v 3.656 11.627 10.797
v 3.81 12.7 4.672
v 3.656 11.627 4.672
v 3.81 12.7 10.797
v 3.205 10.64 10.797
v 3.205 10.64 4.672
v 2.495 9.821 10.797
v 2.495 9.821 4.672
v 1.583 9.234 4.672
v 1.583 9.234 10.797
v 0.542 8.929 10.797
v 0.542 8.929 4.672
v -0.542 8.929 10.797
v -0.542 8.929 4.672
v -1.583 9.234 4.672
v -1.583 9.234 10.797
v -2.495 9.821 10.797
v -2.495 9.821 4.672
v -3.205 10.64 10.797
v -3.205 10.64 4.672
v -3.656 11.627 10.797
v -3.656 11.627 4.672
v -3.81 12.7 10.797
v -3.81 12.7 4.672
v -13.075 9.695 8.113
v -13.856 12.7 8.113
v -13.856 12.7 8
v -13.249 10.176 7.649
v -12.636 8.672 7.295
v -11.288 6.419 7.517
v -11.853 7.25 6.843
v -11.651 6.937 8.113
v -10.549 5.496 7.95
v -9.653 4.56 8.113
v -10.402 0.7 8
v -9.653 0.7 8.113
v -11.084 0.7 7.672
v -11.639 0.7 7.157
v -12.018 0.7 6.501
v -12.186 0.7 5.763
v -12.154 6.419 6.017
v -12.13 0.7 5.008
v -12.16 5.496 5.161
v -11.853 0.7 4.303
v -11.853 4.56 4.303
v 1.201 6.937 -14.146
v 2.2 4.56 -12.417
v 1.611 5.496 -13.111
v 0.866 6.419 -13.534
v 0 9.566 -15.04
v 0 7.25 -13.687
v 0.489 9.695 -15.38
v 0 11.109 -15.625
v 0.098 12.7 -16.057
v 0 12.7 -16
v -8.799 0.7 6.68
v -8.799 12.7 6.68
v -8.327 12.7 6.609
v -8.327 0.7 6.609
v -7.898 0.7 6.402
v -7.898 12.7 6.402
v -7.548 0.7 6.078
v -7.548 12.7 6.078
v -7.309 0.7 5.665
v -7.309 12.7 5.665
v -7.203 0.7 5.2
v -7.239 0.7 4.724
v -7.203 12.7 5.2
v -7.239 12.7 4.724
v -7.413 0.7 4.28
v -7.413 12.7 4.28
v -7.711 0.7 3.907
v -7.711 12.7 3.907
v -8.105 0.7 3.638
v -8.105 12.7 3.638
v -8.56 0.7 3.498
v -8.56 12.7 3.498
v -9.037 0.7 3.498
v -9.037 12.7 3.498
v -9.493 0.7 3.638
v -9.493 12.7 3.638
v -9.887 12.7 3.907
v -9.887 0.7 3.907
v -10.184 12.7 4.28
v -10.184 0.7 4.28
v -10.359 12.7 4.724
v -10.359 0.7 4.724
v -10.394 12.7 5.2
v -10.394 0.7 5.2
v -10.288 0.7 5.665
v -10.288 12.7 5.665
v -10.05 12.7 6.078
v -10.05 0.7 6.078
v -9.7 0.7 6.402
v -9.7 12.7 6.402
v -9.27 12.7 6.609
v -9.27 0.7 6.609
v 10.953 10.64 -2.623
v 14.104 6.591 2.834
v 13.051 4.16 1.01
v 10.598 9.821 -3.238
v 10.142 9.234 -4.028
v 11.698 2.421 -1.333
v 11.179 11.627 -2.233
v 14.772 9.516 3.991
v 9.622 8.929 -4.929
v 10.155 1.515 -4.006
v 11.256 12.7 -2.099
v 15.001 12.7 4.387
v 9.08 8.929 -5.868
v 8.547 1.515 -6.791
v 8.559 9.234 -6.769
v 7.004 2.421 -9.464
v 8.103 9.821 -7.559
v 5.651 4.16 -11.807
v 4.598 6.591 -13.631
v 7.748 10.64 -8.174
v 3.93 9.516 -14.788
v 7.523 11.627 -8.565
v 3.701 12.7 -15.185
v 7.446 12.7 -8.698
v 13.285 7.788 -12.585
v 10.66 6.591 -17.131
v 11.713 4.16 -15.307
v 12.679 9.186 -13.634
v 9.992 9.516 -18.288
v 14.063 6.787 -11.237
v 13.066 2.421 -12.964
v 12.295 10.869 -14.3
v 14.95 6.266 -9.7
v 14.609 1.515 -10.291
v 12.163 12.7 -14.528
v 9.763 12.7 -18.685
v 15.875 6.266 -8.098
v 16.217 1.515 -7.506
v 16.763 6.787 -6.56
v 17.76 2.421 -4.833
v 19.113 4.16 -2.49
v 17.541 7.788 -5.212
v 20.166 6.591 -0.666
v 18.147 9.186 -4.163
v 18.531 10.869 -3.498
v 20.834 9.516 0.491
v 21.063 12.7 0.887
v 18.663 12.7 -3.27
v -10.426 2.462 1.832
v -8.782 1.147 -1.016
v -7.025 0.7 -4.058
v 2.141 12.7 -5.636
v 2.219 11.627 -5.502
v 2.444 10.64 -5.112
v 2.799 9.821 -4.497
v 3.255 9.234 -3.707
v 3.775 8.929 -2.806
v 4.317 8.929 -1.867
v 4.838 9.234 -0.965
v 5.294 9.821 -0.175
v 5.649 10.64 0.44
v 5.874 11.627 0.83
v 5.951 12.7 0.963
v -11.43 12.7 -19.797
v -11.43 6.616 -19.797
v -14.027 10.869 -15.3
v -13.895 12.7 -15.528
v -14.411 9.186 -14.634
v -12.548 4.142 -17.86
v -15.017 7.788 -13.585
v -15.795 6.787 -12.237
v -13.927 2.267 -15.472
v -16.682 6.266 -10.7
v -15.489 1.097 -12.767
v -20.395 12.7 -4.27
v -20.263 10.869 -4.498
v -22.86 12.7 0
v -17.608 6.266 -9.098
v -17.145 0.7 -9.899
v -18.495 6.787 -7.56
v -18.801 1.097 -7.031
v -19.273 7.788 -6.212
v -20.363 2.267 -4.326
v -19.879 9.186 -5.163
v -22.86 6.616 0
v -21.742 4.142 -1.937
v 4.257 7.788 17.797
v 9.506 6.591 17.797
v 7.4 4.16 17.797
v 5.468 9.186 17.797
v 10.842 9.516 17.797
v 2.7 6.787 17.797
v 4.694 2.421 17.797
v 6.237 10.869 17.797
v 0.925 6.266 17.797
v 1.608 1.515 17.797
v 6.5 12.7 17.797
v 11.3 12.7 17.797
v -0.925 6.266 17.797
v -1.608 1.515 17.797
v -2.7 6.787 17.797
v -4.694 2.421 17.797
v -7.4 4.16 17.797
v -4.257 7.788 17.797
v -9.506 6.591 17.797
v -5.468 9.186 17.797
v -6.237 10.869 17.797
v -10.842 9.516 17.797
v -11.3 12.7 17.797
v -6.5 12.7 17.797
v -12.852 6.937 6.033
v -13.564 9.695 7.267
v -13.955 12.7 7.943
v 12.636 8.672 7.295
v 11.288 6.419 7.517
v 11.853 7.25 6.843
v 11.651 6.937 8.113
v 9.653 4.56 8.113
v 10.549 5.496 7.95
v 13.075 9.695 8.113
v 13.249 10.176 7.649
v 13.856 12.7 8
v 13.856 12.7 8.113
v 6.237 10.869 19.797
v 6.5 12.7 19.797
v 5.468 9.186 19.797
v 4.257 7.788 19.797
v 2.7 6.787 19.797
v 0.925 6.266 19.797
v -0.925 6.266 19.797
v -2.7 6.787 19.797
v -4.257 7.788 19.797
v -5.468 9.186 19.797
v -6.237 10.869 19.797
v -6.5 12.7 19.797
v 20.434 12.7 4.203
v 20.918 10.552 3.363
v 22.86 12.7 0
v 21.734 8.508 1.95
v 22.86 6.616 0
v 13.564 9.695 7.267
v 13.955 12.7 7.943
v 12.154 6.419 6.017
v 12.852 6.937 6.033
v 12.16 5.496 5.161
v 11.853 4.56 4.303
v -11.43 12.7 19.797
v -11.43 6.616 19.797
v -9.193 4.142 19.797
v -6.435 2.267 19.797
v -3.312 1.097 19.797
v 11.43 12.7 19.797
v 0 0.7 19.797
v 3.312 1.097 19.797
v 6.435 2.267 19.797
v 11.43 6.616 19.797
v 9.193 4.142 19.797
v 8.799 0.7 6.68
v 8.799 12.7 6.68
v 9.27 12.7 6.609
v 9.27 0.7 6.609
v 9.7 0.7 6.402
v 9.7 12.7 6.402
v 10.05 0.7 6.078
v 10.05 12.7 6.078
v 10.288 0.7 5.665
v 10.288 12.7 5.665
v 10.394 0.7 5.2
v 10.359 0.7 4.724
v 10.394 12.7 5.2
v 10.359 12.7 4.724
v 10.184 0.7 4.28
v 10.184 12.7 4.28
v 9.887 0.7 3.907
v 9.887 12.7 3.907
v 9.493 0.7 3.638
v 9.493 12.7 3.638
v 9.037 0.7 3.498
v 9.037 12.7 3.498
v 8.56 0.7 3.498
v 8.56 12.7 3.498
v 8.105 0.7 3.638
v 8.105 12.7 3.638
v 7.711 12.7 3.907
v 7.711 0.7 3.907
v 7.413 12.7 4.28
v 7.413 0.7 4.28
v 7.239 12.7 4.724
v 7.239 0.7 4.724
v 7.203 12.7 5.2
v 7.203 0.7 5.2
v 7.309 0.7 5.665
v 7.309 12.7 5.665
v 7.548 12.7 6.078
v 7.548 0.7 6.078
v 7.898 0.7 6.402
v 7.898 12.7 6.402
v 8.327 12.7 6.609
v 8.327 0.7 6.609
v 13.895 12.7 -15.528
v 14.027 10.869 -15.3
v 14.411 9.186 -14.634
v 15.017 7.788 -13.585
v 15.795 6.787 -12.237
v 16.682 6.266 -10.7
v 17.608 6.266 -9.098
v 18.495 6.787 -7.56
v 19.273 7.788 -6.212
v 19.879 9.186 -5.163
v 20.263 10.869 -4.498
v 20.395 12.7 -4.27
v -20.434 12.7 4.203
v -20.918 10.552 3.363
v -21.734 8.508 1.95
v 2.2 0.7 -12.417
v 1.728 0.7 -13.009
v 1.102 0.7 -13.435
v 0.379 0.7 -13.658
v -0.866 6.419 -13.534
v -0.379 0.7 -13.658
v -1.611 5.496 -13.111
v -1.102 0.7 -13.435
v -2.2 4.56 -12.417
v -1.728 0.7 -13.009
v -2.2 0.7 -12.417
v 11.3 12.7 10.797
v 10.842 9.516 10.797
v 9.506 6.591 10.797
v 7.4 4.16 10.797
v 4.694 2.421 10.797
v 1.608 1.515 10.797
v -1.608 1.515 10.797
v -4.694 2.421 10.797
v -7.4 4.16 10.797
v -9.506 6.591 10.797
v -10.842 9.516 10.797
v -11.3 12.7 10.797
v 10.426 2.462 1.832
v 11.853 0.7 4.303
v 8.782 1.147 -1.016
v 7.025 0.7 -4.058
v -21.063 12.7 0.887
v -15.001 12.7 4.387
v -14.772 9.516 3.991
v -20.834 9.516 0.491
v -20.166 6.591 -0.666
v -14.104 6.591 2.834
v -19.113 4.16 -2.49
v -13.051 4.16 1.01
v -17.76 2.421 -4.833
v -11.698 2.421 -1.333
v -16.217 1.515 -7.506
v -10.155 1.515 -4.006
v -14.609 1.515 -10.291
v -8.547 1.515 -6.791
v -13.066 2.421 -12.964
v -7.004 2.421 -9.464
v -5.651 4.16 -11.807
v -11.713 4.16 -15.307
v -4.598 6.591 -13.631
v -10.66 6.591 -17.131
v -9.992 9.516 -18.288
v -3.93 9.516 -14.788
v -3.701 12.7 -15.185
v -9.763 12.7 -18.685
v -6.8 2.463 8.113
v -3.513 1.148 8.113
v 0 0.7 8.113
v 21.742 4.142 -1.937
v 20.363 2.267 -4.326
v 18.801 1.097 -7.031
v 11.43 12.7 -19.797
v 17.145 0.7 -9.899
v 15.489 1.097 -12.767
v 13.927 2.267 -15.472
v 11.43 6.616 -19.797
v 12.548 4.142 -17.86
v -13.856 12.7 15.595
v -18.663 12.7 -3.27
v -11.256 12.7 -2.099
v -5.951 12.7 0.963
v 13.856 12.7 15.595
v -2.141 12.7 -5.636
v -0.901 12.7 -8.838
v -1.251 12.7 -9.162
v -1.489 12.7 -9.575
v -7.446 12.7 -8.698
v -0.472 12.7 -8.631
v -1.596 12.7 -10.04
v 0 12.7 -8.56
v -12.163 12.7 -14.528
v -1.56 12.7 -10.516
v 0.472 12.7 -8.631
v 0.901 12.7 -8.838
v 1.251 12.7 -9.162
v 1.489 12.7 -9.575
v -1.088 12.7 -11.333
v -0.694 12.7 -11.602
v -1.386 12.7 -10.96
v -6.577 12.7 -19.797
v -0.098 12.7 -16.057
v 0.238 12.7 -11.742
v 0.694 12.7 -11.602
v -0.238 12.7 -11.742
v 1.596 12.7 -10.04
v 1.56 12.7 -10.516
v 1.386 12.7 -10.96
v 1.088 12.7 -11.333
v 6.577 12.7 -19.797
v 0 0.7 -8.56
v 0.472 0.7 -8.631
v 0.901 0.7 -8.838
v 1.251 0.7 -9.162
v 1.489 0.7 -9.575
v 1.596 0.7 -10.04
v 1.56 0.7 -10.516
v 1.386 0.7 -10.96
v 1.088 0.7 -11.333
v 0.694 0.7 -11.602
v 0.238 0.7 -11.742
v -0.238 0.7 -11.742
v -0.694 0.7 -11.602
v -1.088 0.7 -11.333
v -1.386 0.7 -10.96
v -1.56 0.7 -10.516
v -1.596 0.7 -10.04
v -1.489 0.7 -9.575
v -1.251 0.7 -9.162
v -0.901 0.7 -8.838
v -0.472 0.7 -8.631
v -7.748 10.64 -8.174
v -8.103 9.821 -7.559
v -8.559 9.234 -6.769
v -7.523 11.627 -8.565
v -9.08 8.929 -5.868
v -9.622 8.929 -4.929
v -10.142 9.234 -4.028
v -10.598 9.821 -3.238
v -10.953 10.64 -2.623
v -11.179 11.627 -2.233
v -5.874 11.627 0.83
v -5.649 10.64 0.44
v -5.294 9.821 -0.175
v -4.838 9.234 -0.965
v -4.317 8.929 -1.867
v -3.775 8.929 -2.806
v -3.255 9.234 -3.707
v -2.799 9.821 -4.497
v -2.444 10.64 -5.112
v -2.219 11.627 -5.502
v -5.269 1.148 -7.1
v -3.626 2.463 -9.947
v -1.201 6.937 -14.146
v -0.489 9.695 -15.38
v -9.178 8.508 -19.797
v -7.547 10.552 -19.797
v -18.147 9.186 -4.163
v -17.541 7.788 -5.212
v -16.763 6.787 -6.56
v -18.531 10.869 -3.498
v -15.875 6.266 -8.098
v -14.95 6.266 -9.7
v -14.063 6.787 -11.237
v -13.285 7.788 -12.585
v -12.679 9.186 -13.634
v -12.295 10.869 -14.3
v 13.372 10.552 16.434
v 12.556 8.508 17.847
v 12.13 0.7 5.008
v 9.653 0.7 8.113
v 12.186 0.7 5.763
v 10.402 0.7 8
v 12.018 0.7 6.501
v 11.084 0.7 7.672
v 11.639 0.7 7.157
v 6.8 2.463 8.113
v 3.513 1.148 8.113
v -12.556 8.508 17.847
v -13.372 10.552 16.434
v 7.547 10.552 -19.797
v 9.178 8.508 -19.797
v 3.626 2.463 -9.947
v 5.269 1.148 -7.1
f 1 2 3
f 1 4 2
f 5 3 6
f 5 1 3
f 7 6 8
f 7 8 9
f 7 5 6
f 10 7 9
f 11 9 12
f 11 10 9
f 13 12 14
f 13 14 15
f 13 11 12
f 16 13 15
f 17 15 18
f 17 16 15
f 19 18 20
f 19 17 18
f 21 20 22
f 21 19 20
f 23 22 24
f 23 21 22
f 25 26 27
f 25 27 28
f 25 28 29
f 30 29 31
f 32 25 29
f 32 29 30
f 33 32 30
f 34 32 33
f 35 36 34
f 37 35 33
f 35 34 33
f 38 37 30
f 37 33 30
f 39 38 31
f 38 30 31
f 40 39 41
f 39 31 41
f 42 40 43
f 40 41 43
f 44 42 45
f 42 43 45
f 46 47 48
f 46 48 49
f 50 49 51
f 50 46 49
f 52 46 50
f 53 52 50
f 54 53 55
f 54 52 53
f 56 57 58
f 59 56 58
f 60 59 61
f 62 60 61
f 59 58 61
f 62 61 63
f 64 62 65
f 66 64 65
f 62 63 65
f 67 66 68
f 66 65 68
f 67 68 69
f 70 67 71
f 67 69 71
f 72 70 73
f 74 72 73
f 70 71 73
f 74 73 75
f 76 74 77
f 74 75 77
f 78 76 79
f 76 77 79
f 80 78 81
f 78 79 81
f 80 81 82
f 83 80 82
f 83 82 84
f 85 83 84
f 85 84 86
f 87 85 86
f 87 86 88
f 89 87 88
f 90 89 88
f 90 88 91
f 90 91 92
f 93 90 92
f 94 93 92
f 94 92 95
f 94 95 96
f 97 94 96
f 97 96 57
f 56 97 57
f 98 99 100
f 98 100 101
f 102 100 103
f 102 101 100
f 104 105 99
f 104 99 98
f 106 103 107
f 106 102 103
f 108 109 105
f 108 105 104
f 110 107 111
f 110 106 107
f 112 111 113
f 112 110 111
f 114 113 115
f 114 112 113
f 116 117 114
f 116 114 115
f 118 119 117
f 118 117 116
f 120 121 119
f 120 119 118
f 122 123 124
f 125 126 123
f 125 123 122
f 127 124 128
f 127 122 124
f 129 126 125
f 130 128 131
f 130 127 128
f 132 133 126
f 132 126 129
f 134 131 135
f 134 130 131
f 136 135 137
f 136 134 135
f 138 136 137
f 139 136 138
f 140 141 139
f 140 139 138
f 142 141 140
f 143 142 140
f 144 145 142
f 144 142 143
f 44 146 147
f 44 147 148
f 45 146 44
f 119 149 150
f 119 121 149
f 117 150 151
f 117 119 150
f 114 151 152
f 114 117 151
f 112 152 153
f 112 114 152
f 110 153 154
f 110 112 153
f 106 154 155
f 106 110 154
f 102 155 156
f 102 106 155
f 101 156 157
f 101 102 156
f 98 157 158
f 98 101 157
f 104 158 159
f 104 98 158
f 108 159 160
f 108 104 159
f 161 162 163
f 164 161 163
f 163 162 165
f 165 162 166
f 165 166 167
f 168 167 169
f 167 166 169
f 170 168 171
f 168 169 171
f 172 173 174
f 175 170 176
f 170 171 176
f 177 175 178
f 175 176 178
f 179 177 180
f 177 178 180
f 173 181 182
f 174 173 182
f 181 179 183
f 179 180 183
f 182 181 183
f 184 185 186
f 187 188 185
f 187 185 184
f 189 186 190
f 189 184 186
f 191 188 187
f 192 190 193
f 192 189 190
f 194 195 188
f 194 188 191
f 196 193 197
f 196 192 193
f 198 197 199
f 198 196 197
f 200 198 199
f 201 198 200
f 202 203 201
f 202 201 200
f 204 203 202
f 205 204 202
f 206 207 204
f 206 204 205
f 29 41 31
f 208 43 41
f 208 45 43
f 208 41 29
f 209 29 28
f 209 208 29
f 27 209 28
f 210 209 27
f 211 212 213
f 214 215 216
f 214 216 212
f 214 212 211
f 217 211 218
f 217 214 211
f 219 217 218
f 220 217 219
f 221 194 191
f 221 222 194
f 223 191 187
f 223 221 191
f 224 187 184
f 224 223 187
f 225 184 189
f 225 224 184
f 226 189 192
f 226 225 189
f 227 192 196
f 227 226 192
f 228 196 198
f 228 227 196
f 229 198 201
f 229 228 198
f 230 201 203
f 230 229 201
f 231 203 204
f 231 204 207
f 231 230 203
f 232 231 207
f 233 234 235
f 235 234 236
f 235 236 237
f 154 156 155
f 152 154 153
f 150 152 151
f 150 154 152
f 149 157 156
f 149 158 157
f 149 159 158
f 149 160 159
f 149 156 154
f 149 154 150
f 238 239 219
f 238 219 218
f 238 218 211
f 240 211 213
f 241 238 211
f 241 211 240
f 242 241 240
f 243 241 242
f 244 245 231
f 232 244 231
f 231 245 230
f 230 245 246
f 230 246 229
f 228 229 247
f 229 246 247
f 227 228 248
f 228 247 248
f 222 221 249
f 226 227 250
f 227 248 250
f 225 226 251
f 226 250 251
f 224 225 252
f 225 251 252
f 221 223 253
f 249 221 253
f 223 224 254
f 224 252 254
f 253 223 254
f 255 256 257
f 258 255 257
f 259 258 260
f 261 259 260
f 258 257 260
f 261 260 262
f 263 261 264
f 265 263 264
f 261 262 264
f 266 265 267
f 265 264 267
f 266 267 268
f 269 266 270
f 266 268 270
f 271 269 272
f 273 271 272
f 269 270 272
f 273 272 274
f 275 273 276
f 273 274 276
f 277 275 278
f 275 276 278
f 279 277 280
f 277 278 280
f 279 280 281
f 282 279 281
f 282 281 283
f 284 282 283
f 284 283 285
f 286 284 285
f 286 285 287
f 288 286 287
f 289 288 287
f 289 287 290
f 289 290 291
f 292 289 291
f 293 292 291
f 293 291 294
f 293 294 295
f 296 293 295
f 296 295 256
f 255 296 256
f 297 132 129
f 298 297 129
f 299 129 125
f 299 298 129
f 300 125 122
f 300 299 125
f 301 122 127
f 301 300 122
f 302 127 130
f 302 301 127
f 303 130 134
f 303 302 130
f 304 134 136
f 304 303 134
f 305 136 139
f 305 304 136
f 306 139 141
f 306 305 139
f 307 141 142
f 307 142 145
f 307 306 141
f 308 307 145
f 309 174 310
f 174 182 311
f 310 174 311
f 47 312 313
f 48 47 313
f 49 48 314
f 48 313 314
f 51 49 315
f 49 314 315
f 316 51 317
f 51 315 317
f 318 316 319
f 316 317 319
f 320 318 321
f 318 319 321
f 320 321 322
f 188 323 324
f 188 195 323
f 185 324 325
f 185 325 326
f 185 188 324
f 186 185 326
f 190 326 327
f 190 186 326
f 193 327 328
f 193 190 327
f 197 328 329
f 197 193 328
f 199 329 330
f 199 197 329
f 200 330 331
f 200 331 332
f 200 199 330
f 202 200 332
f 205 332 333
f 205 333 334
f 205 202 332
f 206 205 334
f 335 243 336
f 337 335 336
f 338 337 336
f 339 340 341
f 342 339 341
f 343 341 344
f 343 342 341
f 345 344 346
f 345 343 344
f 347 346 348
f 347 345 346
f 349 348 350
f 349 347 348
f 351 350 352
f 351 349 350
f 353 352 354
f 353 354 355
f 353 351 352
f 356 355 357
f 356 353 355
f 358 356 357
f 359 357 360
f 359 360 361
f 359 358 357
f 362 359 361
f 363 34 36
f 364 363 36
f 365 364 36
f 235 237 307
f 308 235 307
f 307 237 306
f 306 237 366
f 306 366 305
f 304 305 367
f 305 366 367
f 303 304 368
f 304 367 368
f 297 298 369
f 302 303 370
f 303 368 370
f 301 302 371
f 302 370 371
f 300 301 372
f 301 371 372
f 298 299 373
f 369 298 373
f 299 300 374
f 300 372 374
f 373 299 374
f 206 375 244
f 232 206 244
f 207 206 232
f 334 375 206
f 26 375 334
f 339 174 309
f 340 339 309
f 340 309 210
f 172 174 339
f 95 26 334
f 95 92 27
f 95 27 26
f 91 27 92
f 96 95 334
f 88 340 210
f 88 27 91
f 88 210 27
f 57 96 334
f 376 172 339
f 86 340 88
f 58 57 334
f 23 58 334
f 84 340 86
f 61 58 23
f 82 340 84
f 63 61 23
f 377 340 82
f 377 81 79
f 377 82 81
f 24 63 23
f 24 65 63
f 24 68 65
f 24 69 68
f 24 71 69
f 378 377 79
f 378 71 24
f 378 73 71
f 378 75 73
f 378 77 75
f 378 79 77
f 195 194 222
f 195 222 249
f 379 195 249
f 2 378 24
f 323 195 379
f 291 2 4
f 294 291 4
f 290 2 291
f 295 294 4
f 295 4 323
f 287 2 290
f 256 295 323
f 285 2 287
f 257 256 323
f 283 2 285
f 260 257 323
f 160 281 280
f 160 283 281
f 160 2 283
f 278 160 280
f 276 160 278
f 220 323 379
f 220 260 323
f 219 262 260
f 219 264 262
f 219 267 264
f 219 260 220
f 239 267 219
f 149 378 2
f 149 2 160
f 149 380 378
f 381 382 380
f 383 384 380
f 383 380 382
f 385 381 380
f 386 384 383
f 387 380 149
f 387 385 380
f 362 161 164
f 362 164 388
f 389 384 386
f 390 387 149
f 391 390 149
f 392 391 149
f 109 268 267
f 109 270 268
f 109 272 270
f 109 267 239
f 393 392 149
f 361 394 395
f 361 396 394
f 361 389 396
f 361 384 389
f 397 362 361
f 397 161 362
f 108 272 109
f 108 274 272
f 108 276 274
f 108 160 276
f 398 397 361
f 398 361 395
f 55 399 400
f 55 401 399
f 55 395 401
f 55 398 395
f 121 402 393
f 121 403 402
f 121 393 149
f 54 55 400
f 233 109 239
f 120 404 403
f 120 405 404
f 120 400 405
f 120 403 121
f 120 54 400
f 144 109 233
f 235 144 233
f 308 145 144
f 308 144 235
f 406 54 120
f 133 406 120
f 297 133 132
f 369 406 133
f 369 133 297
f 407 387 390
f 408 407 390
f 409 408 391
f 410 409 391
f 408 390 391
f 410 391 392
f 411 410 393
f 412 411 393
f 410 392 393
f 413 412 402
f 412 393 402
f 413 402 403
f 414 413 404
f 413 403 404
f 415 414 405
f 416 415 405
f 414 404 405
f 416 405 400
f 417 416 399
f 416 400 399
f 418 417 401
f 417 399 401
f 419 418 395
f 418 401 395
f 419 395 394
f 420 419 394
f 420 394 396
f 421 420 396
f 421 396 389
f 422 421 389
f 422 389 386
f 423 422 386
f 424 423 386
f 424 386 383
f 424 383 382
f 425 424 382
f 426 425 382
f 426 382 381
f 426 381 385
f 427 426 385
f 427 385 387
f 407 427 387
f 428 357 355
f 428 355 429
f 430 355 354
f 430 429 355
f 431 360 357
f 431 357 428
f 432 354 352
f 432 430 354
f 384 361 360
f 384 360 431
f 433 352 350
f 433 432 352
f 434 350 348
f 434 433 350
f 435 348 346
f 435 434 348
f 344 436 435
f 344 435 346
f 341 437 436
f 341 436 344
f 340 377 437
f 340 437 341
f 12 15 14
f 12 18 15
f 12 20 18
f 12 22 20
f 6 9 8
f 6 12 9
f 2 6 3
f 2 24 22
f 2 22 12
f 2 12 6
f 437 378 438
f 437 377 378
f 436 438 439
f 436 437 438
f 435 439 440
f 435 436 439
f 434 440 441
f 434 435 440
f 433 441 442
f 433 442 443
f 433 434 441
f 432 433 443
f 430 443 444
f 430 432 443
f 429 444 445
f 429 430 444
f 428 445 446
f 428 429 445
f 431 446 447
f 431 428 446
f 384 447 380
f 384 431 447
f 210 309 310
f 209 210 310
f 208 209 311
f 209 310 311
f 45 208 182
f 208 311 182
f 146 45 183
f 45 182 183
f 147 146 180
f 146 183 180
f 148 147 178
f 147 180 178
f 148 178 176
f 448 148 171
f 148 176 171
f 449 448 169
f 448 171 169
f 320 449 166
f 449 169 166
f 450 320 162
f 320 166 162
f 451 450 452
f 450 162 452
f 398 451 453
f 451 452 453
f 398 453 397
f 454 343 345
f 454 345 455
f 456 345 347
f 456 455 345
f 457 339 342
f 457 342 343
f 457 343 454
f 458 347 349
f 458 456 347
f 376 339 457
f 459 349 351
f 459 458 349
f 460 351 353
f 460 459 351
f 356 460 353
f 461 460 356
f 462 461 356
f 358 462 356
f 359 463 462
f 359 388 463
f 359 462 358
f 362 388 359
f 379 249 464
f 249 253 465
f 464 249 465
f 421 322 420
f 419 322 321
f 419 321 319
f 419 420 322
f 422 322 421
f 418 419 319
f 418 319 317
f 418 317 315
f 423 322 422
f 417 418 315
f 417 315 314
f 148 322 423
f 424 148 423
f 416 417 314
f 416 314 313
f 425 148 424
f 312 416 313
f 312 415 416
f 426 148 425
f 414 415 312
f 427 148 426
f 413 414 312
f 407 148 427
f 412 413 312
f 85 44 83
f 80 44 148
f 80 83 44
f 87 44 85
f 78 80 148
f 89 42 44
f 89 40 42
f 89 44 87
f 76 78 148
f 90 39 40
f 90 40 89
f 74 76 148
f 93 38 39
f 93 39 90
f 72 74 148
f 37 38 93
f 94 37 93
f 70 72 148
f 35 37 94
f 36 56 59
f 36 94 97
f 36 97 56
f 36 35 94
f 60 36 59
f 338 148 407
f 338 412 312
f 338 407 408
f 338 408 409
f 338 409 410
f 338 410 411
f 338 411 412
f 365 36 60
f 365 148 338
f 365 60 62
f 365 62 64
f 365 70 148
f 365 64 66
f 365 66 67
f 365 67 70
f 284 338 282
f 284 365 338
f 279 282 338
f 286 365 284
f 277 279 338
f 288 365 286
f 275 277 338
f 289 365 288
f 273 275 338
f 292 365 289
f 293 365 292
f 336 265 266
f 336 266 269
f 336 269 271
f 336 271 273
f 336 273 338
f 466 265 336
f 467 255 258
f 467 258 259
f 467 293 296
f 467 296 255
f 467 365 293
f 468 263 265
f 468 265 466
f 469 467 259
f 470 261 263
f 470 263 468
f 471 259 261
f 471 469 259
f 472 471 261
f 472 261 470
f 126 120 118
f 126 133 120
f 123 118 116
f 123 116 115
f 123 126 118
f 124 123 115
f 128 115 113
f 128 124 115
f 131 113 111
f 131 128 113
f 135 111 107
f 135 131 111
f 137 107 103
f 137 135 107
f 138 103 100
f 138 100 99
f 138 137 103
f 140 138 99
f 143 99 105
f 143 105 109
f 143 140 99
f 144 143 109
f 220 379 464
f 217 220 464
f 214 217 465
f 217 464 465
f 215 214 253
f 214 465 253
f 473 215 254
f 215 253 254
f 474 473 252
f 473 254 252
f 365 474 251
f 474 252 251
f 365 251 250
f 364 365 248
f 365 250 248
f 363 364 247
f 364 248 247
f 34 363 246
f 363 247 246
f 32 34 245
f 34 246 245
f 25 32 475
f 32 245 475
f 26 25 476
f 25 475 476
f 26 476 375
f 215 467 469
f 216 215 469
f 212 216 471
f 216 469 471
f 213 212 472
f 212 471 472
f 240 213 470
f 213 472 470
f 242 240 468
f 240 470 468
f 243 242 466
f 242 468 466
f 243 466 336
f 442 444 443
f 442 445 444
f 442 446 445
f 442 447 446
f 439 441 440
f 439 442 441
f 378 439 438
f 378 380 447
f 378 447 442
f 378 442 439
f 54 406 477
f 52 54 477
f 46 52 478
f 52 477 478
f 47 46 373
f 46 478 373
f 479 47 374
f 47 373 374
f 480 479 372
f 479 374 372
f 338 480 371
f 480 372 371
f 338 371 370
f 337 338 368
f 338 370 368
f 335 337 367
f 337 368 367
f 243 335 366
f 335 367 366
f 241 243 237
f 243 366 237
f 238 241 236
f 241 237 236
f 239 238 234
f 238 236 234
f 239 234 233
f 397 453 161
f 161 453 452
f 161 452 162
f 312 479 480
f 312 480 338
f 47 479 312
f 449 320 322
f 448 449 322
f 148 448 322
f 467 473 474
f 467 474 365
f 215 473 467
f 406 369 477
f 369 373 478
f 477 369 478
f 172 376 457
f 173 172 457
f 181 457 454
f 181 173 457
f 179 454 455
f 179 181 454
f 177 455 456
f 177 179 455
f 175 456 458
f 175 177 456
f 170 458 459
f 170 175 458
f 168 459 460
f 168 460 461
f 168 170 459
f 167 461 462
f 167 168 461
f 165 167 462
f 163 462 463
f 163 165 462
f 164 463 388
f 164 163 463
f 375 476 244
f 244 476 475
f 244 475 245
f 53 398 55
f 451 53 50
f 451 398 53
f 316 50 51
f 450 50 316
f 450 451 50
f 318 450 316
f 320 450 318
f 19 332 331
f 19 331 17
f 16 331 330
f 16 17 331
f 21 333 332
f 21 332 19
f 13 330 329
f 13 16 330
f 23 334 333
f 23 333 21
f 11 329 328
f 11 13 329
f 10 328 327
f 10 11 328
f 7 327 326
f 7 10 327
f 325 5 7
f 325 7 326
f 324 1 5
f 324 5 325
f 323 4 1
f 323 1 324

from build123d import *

# Parameters (mm, degrees)
BOSS_EXTRUDE1_DEPTH = 12.7
SKETCH7_R           = 1.6
CUT_EXTRUDE2_DEPTH  = 12.7
CIRPATTERN1_COUNT   = 3
CUT_EXTRUDE3_DEPTH  = 11.684
CIRPATTERN2_COUNT   = 3
CUT_EXTRUDE5_DEPTH  = 0.7
FILLET2_R           = 2.54


with BuildPart() as part:
    # Sketch1 → Boss-Extrude1 (new body)
    with BuildSketch(Plane(origin=(0, 0, 0), x_dir=(1, 0, 0), z_dir=(0, 1, 0))):
        Polygon((11.43, -19.797340731), (22.86, 0), (11.43, 19.797340731), (-11.43, 19.797340731), (-22.86, 0), (-11.43, -19.797340731), align=None)
    extrude(amount=BOSS_EXTRUDE1_DEPTH)

    # Sketch5 → Cut-Revolve1 (revolve, cut)
    with BuildSketch(Plane(origin=(0, 12.7, 0), x_dir=(1, 0, 0), z_dir=(0, 1, 0))):
        Polygon((0, -19.797340731), (0, -4.672340739), (-3.81, -4.672340739), (-3.81, -10.797340731), (-11.300000006, -10.797340731), (-11.300000006, -17.797340731), (-6.5, -17.797340731), (-6.5, -19.797340731), align=None)
    cut_revolve1 = revolve(axis=Axis((0, 12.7, 19.797340731), (0, 0, -1)), mode=Mode.SUBTRACT)

    # Sketch7 → Cut-Extrude2 (cut)
    with BuildSketch(Plane(origin=(0, 12.7, 0), x_dir=(1, 0, 0), z_dir=(0, 1, 0))):
        with Locations(Location((0, 10.16, 0), (0, 0, 270))):
            Circle(SKETCH7_R)
        with Locations(Location((8.798818102, -5.08, 0), (0, 0, 270))):
            Circle(SKETCH7_R)
        with Locations(Location((-8.798818102, -5.08, 0), (0, 0, 270))):
            Circle(SKETCH7_R)
    extrude(amount=-CUT_EXTRUDE2_DEPTH, mode=Mode.SUBTRACT)

    # CirPattern1: Cut-Revolve1 ×3 about axis
    cirpattern1_axis = Axis((0, 0, 0), (0, 1, 0))
    for i in range(1, CIRPATTERN1_COUNT):
        add(cut_revolve1.rotate(cirpattern1_axis, i * 360 / CIRPATTERN1_COUNT), mode=Mode.SUBTRACT)

    # Sketch8 → Cut-Extrude3 (cut)
    with BuildSketch(Plane.XY.offset(19.797340731)):
        with BuildLine():
            Line((-13.856406592, 12.7), (-18.662949192, 12.7))
            Line((-18.662949192, 12.7), (-18.662949192, 0))
            Line((-18.662949192, 0), (18.662949192, 0))
            Line((18.662949192, 0), (18.662949192, 12.7))
            Line((18.662949192, 12.7), (13.856406592, 12.7))
            ThreePointArc((13.856406592, 12.7), (0, 0.69999987), (-13.856406592, 12.7))
        make_face()
    cut_extrude3 = extrude(amount=-CUT_EXTRUDE3_DEPTH, mode=Mode.SUBTRACT)

    # CirPattern2: Cut-Extrude3 ×3 about axis
    cirpattern2_axis = Axis((0, 0, 0), (0, 1, 0))
    for i in range(1, CIRPATTERN2_COUNT):
        add(cut_extrude3.rotate(cirpattern2_axis, i * 360 / CIRPATTERN2_COUNT), mode=Mode.SUBTRACT)

    # Sketch10 → Cut-Extrude5 (cut)
    with BuildSketch(Plane.XZ):
        Polygon((14.052718364, 8.113340731), (-14.052718364, 8.113340731), (0, -16.226681461), align=None)
    extrude(amount=-CUT_EXTRUDE5_DEPTH, mode=Mode.SUBTRACT)

    # Fillet2
    # the kernel refuses this fillet: 2.54 mm, written as the material it takes off along each edge
    with BuildSketch(Plane(origin=(14.052718364, -10.298522628, 8.113340731), x_dir=(-0.4999999999999996, 0, -0.8660254037844387), z_dir=(0, 1, 0))) as fillet2_piece_1_section:
        with BuildLine():
            CenterArc((FILLET2_R * 1.73205080757, FILLET2_R), FILLET2_R, 150, 120)
            Line((FILLET2_R * 0.866025403784, FILLET2_R * 1.5), (0, 0))
            Line((0, 0), (FILLET2_R * 1.73205080757, 0))
        make_face()
    fillet2_piece_1 = extrude(amount=33.997045256, mode=Mode.PRIVATE)
    fillet2_piece_1 = fillet2_piece_1 - Plane(origin=(6.277314066, 14.7, -3.624208966), x_dir=(-0.49487165940112743, -0.14285714153061227, -0.8571428573086736), z_dir=(0.8660254037844388, 0, -0.49999999999999983)) * Cylinder(14.00000013, 86, mode=Mode.PRIVATE)
    fillet2_piece_1 = fillet2_piece_1 - Plane(origin=(0, 14.7, 7.248417919), x_dir=(0.9897433188022552, -0.14285714153061224, 0), z_dir=(0, 0, 1)) * Cylinder(14.00000013, 86, mode=Mode.PRIVATE)
    add(fillet2_piece_1, mode=Mode.SUBTRACT)
    with BuildSketch(Plane(origin=(0, -10.298522628, -16.226681461), x_dir=(-0.5000000000000003, 0, 0.8660254037844386), z_dir=(0, 1, 0))) as fillet2_piece_2_section:
        with BuildLine():
            CenterArc((FILLET2_R * 1.73205080757, FILLET2_R), FILLET2_R, 150, 120)
            Line((FILLET2_R * 0.866025403784, FILLET2_R * 1.5), (0, 0))
            Line((0, 0), (FILLET2_R * 1.73205080757, 0))
        make_face()
    fillet2_piece_2 = extrude(amount=33.997045256, mode=Mode.PRIVATE)
    fillet2_piece_2 = fillet2_piece_2 - Plane(origin=(6.277314055, 14.7, -3.62420896), x_dir=(-0.49487165940112743, -0.14285714153061227, -0.8571428573086736), z_dir=(0.8660254037844388, 0, -0.49999999999999983)) * Cylinder(14.00000013, 86, mode=Mode.PRIVATE)
    fillet2_piece_2 = fillet2_piece_2 - Plane(origin=(-6.277314066, 14.7, -3.624208966), x_dir=(-0.4948716594011281, -0.14285714153061227, 0.8571428573086732), z_dir=(-0.8660254037844384, 0, -0.5000000000000004)) * Cylinder(14.00000013, 86, mode=Mode.PRIVATE)
    add(fillet2_piece_2, mode=Mode.SUBTRACT)
    with BuildSketch(Plane(origin=(-14.052718364, 23.698522628, 8.113340731), x_dir=(1, 0, 0), z_dir=(0, -1, 0))) as fillet2_piece_3_section:
        with BuildLine():
            CenterArc((FILLET2_R * 1.73205080757, -FILLET2_R), FILLET2_R, 90, 120)
            Line((FILLET2_R * 0.866025403784, -FILLET2_R * 1.5), (0, 0))
            Line((0, 0), (FILLET2_R * 1.73205080757, 0))
        make_face()
    fillet2_piece_3 = extrude(amount=33.997045256, mode=Mode.PRIVATE)
    fillet2_piece_3 = fillet2_piece_3 - Plane(origin=(0, 14.7, 7.248417932), x_dir=(0.9897433188022552, -0.14285714153061224, 0), z_dir=(0, 0, 1)) * Cylinder(14.00000013, 86, mode=Mode.PRIVATE)
    fillet2_piece_3 = fillet2_piece_3 - Plane(origin=(-6.277314055, 14.7, -3.62420896), x_dir=(-0.4948716594011281, -0.14285714153061227, 0.8571428573086732), z_dir=(-0.8660254037844384, 0, -0.5000000000000004)) * Cylinder(14.00000013, 86, mode=Mode.PRIVATE)
    add(fillet2_piece_3, mode=Mode.SUBTRACT)


solid = part.part
